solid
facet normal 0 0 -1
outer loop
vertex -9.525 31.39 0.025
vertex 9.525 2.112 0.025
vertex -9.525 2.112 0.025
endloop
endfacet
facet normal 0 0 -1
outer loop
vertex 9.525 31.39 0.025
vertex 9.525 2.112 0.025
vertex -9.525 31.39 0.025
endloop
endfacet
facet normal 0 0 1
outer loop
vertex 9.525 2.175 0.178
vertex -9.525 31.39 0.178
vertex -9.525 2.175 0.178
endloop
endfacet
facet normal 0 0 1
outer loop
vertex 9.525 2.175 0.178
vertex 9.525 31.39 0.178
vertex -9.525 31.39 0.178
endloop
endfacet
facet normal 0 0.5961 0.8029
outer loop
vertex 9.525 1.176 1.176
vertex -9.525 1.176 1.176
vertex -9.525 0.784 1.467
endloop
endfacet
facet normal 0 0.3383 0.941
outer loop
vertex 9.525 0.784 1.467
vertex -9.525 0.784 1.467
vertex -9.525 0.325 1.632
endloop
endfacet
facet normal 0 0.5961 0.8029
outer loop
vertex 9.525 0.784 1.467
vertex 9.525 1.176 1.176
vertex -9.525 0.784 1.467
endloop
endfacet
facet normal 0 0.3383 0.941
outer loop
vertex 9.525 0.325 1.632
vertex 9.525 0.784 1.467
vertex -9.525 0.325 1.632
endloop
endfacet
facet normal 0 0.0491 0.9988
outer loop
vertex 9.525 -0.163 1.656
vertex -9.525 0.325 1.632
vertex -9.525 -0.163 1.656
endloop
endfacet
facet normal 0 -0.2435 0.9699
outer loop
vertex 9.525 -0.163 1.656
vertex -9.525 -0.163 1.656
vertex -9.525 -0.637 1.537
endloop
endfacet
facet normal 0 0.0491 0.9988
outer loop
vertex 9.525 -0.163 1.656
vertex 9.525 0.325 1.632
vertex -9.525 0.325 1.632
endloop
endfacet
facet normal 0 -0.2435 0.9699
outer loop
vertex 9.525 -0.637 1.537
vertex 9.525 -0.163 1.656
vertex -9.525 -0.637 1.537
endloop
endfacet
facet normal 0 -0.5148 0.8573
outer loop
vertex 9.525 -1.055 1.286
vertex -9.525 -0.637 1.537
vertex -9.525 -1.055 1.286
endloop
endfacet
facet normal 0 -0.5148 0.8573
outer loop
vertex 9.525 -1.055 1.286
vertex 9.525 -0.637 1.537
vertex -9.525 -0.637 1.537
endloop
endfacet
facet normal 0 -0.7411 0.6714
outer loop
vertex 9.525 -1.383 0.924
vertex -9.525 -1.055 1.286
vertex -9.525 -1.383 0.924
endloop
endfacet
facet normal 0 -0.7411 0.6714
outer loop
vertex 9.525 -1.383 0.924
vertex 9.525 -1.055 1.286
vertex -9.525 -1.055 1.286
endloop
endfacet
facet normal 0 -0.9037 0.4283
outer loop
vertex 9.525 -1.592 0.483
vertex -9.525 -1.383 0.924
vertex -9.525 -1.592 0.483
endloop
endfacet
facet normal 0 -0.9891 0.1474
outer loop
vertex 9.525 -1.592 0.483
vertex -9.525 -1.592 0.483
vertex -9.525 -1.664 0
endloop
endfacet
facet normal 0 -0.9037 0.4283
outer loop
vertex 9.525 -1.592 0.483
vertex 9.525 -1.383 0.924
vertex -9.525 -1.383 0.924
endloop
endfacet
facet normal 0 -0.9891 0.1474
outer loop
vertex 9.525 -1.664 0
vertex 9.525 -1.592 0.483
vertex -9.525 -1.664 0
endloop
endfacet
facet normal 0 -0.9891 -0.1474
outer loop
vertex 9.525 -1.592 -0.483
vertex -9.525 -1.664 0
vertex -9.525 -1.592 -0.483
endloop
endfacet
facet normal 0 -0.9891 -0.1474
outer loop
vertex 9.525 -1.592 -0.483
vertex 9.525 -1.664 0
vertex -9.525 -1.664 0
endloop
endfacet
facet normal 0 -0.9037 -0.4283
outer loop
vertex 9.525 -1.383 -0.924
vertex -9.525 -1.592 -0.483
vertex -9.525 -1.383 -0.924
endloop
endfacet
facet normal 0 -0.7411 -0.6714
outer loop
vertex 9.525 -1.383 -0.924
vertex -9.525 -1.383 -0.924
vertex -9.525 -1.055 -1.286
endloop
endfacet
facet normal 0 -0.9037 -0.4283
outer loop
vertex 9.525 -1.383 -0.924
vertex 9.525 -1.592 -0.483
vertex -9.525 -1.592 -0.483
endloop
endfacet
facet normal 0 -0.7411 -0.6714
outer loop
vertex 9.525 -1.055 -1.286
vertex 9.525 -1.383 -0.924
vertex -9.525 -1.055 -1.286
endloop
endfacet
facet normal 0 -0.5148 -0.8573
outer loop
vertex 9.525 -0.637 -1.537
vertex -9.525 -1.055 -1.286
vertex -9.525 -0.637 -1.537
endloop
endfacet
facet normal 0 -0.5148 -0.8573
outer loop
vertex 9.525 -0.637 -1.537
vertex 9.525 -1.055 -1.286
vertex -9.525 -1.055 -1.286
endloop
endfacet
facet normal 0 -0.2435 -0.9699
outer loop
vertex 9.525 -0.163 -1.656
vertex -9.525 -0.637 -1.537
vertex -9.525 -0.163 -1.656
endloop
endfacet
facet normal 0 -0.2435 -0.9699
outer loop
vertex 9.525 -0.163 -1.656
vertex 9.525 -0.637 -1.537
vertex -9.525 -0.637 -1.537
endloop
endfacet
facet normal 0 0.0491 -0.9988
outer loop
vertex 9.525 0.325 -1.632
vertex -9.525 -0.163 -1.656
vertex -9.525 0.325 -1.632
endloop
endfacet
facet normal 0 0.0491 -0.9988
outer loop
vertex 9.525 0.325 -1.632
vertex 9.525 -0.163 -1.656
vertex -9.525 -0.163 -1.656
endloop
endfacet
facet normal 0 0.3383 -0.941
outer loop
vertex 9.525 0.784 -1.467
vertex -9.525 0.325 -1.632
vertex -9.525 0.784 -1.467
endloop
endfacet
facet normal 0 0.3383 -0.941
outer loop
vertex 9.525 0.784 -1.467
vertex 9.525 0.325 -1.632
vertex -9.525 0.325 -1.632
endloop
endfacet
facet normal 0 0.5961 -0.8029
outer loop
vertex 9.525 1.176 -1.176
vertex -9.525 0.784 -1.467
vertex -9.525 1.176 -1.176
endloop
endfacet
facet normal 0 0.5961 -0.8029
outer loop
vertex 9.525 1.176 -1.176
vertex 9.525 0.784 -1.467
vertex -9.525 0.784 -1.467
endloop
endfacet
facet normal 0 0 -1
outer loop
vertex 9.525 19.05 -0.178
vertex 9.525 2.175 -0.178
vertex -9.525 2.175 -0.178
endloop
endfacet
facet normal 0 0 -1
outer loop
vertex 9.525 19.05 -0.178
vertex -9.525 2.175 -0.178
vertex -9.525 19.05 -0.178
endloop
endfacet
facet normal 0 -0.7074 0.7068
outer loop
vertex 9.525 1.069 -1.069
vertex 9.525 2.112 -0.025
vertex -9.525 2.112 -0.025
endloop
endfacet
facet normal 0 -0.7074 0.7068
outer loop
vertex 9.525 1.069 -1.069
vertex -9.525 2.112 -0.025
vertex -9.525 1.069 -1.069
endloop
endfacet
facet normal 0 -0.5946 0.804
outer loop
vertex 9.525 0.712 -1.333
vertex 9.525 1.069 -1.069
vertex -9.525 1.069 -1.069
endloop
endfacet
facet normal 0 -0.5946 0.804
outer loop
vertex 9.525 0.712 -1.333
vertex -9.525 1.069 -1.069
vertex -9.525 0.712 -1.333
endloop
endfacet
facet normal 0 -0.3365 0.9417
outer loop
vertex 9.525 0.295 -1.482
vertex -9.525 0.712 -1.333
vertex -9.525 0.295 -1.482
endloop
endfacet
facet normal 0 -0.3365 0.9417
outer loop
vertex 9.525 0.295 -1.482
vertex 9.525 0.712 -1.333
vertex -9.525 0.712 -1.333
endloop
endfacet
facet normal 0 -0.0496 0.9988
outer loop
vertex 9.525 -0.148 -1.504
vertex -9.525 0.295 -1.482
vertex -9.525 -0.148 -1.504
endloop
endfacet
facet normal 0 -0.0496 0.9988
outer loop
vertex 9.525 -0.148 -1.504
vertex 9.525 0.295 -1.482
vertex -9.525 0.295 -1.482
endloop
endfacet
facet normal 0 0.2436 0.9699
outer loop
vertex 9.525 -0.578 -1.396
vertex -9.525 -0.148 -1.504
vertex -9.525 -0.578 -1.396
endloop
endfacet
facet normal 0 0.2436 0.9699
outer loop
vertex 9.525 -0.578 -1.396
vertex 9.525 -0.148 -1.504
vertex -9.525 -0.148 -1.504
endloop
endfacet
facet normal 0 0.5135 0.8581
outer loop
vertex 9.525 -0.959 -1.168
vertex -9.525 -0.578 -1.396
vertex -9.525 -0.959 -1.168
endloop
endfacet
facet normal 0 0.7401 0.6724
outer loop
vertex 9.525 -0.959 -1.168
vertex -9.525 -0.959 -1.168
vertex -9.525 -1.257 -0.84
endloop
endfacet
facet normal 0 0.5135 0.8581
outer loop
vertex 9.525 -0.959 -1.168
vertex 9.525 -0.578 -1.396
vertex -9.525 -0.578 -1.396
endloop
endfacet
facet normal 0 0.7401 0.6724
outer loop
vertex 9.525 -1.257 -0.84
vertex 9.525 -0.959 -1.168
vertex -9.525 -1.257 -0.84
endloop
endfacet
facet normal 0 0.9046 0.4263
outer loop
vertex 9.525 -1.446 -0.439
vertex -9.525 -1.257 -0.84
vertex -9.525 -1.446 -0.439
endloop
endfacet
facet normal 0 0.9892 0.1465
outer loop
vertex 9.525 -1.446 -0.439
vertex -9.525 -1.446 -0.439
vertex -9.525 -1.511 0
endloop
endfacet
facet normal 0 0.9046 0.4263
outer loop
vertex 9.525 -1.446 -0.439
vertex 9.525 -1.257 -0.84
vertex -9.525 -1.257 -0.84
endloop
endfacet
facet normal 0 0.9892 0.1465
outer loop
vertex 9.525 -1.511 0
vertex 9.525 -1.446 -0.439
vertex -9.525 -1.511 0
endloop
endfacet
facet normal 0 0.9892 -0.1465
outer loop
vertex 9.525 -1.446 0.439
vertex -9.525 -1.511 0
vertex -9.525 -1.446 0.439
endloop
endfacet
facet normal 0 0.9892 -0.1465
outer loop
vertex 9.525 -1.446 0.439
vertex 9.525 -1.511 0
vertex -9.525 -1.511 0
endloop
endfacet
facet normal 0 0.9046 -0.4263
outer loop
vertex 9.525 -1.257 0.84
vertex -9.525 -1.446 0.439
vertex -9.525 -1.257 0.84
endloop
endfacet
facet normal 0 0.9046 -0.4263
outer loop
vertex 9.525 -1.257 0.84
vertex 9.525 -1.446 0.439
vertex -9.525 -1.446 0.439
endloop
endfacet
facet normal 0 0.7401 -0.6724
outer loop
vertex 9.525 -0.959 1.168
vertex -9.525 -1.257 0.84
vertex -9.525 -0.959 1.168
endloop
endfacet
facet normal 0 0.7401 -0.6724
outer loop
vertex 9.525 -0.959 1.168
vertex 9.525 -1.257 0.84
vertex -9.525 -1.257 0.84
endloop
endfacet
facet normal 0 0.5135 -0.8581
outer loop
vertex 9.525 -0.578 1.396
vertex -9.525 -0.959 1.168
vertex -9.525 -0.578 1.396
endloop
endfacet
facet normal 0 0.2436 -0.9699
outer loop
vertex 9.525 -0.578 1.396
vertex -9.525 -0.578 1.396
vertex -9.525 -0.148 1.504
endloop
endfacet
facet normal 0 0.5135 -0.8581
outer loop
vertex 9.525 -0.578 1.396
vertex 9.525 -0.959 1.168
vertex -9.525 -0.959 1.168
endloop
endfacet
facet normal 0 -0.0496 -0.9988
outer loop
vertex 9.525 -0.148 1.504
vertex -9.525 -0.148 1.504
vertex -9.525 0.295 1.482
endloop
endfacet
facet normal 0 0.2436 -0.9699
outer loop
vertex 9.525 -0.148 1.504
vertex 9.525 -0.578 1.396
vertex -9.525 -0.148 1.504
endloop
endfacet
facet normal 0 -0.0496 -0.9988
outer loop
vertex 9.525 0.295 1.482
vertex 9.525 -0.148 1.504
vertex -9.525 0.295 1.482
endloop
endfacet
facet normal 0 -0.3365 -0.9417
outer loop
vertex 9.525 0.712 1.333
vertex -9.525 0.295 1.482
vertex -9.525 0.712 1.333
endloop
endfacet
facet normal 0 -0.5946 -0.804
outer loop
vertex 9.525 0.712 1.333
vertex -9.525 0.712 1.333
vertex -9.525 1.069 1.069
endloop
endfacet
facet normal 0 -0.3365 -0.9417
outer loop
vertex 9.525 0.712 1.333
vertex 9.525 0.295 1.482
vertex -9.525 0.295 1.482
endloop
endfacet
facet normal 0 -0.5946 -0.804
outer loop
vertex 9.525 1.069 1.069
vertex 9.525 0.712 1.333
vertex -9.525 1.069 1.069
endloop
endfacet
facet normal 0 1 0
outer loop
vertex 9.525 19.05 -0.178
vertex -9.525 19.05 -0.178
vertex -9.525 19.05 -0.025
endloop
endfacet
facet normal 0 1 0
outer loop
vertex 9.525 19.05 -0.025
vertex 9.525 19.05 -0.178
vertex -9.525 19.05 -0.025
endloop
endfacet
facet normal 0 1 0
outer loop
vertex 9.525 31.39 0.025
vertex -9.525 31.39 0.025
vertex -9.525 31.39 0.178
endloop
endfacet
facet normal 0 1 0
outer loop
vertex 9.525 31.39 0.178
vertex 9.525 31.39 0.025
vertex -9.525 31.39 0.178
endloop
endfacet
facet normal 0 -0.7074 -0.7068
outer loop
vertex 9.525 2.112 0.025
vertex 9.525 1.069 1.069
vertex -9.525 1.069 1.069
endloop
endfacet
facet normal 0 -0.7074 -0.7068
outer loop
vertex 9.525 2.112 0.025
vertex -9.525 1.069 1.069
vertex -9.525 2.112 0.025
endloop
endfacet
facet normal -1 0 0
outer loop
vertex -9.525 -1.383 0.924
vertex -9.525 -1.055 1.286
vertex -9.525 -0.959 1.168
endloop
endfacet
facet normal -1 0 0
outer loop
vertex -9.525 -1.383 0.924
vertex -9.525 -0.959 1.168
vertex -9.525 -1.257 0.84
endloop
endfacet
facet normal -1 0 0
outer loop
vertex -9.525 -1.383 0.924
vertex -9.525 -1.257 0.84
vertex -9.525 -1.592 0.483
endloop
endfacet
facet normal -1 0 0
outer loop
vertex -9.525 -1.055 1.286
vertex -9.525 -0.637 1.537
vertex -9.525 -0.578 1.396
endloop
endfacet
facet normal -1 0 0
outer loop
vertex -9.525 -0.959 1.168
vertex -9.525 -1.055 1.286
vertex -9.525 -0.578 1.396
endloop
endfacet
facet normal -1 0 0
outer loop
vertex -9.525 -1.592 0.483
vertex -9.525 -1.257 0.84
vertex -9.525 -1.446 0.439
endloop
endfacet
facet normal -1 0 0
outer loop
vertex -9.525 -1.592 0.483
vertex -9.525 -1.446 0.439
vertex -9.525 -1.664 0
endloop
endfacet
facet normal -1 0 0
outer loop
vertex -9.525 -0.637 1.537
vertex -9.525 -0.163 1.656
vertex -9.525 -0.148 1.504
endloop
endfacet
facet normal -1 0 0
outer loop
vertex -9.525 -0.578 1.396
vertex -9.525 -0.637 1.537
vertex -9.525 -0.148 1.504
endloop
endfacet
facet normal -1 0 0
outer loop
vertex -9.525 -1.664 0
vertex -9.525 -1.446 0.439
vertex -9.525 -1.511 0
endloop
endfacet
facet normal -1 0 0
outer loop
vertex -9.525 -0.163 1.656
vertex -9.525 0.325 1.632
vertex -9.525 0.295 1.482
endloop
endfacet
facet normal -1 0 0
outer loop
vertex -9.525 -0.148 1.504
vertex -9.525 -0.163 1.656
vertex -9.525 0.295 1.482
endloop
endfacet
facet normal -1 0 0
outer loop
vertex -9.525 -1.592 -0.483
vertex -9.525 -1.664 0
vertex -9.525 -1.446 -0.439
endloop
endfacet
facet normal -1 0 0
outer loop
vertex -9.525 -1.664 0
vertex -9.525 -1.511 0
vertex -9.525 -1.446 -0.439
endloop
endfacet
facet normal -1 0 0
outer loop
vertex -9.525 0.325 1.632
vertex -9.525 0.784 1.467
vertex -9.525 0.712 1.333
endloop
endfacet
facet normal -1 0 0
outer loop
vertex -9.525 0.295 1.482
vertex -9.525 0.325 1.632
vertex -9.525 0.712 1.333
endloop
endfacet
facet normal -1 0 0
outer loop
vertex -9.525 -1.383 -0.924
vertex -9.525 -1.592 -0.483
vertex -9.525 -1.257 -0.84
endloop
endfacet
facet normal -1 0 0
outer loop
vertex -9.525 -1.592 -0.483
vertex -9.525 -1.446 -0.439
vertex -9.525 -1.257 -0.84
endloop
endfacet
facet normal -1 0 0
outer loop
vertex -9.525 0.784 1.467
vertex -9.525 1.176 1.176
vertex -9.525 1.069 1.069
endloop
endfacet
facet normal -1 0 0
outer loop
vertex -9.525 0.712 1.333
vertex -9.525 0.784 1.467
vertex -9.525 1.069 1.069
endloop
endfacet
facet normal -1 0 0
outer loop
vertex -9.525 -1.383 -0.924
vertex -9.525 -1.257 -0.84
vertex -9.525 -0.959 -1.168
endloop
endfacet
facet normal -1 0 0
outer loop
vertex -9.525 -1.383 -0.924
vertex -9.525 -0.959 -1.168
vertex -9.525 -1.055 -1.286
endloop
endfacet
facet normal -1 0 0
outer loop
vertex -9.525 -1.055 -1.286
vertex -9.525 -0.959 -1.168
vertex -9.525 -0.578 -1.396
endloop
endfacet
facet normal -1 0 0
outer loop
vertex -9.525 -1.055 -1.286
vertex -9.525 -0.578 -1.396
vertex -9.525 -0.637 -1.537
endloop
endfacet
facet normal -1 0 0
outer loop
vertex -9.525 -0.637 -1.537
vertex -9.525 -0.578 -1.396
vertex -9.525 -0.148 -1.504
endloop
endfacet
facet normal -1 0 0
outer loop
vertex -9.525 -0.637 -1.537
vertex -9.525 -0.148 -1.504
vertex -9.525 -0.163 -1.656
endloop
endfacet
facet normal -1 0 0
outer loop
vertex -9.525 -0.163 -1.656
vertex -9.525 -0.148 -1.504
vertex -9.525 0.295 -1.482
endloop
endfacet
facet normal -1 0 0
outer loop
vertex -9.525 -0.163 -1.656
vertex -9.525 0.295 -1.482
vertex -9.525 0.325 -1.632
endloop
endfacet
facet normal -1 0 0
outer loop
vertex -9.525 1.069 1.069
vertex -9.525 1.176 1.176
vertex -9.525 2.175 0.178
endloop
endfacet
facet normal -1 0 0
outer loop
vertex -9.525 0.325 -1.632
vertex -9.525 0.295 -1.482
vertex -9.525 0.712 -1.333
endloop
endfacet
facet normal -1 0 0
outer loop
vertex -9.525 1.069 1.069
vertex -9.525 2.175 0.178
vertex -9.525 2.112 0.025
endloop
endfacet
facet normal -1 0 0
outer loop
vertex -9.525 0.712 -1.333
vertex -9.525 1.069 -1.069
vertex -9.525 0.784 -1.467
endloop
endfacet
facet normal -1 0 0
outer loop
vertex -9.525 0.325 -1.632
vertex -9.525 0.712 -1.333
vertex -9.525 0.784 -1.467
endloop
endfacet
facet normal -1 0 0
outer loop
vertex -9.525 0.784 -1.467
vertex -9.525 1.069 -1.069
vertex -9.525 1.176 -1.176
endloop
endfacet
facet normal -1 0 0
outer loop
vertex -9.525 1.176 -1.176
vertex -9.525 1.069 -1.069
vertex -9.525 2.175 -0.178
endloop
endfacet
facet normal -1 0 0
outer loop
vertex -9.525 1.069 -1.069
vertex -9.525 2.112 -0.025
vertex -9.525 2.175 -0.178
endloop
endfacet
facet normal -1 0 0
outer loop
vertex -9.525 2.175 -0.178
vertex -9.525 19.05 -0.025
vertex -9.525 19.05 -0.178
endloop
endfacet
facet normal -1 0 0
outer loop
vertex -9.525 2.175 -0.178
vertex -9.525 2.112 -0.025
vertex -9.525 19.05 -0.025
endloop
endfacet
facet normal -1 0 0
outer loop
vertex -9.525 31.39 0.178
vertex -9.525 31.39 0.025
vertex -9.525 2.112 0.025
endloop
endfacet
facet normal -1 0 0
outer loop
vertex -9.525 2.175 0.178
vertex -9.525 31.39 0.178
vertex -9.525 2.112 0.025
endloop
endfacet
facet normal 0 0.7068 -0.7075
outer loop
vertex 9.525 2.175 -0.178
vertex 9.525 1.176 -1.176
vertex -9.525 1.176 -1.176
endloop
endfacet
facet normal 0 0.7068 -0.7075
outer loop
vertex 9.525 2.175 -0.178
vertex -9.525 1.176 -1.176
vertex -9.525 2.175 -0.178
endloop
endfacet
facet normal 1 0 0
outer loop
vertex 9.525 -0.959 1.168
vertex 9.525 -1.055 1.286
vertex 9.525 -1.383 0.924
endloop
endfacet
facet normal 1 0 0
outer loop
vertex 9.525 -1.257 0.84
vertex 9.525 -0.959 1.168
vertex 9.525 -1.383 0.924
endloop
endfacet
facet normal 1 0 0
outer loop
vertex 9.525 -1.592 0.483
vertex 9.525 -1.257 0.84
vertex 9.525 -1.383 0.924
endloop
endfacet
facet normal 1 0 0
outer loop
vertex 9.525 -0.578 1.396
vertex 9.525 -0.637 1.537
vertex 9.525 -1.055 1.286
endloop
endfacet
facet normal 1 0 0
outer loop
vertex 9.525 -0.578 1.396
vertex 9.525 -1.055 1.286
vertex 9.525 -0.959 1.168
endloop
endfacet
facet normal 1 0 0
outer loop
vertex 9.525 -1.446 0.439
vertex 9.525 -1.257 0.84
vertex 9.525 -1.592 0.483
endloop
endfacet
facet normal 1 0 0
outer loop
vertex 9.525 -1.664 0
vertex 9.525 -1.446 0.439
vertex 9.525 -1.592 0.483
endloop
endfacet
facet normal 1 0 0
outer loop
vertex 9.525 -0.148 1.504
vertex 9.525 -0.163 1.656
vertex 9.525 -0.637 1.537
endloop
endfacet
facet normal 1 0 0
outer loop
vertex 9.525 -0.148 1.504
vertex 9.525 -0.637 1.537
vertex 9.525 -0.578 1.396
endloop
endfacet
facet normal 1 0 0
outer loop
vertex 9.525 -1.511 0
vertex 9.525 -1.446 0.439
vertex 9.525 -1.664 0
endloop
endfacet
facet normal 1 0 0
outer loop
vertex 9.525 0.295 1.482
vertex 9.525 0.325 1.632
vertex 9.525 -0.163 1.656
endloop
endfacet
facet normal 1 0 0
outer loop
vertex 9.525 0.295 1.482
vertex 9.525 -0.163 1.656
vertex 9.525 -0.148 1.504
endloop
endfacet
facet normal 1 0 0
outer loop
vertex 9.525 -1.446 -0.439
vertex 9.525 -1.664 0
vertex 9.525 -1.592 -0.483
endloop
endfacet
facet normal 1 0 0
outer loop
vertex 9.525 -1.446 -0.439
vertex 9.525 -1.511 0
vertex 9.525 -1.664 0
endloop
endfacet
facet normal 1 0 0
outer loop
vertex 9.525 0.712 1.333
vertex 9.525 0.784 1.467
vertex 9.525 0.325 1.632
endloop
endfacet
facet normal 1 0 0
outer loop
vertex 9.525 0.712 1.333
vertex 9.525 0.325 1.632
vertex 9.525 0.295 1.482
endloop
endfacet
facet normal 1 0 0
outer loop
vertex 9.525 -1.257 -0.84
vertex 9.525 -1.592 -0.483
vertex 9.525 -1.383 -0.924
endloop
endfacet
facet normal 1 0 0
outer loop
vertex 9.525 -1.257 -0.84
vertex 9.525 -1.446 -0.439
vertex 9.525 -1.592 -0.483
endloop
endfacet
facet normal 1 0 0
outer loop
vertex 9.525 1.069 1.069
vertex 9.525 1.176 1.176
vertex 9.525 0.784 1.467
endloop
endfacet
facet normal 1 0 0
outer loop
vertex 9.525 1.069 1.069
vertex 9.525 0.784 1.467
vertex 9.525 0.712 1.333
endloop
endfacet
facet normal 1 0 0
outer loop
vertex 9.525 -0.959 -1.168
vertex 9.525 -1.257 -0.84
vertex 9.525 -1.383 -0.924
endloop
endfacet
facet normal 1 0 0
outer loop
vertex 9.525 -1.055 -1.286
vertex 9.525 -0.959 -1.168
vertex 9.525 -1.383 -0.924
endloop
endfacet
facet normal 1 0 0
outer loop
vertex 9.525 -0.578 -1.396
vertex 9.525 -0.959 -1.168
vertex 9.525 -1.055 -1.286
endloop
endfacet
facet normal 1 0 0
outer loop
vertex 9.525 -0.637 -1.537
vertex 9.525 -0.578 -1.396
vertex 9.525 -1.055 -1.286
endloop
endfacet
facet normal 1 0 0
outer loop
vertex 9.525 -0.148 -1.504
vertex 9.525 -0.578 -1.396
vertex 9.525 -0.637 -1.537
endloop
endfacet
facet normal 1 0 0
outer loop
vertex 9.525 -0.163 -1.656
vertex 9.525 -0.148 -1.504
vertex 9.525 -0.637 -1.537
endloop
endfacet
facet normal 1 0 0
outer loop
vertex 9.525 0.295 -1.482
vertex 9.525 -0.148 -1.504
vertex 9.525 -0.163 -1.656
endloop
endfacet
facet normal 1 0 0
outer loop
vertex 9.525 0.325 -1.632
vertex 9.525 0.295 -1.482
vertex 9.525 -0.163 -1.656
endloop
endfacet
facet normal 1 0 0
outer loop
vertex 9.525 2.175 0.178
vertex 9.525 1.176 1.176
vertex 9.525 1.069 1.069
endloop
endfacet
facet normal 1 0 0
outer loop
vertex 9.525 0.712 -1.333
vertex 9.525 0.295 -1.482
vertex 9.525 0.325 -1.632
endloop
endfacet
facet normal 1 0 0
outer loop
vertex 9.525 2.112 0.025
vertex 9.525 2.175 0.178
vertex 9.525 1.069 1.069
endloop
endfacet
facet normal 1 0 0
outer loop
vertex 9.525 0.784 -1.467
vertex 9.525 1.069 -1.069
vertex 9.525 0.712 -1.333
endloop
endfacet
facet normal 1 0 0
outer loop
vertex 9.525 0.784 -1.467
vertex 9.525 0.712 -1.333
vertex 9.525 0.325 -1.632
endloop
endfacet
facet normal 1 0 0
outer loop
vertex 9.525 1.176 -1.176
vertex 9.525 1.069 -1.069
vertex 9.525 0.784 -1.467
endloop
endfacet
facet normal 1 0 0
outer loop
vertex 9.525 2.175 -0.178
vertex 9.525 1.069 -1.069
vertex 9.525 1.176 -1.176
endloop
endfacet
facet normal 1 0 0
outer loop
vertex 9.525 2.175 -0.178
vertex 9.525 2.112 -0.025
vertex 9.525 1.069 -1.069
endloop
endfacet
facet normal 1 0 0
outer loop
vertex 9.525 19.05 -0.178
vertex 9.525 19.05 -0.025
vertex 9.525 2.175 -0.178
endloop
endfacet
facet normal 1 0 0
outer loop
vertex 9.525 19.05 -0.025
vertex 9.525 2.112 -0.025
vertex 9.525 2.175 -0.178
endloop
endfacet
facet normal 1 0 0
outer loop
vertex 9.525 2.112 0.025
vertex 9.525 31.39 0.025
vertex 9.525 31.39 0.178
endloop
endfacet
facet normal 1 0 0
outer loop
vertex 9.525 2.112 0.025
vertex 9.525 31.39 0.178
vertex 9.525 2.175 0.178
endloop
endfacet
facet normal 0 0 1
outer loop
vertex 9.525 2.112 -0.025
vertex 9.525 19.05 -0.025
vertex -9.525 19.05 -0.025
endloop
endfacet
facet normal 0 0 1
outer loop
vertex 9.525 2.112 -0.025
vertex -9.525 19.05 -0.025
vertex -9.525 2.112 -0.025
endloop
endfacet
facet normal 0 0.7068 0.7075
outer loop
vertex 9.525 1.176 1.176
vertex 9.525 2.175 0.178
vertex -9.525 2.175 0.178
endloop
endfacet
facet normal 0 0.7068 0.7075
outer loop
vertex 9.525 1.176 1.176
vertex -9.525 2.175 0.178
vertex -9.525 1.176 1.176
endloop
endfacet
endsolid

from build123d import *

# Parameters (mm, degrees)
EXTRUDE_THIN1_DEPTH = 9.525


with BuildPart() as part:
    # Sketch1 → Extrude-Thin1 (new, symmetric)
    with BuildSketch(Plane(origin=(0, 0, 0), x_dir=(0, 0, -1), z_dir=(1, 0, 0))):
        with BuildLine():
            Line((-0.1778, 31.39), (-0.1778, 2.175027104))
            Line((-0.1778, 2.175027104), (-1.176413552, 1.176413552))
            ThreePointArc((-1.176413552, 1.176413552), (0, -1.6637), (1.176413552, 1.176413552))
            Line((1.176413552, 1.176413552), (0.1778, 2.175027104))
            Line((0.1778, 2.175027104), (0.1778, 19.05))
            Line((0.1778, 19.05), (0.0254, 19.05))
            Line((0.0254, 19.05), (0.0254, 2.111900957))
            Line((0.0254, 2.111900957), (1.068650478, 1.068650478))
            ThreePointArc((1.068650478, 1.068650478), (0, -1.5113), (-1.068650478, 1.068650478))
            Line((-1.068650478, 1.068650478), (-0.0254, 2.111900957))
            Line((-0.0254, 2.111900957), (-0.0254, 31.39))
            Line((-0.0254, 31.39), (-0.1778, 31.39))
        make_face()
    extrude(amount=EXTRUDE_THIN1_DEPTH, both=True)


solid = part.part
